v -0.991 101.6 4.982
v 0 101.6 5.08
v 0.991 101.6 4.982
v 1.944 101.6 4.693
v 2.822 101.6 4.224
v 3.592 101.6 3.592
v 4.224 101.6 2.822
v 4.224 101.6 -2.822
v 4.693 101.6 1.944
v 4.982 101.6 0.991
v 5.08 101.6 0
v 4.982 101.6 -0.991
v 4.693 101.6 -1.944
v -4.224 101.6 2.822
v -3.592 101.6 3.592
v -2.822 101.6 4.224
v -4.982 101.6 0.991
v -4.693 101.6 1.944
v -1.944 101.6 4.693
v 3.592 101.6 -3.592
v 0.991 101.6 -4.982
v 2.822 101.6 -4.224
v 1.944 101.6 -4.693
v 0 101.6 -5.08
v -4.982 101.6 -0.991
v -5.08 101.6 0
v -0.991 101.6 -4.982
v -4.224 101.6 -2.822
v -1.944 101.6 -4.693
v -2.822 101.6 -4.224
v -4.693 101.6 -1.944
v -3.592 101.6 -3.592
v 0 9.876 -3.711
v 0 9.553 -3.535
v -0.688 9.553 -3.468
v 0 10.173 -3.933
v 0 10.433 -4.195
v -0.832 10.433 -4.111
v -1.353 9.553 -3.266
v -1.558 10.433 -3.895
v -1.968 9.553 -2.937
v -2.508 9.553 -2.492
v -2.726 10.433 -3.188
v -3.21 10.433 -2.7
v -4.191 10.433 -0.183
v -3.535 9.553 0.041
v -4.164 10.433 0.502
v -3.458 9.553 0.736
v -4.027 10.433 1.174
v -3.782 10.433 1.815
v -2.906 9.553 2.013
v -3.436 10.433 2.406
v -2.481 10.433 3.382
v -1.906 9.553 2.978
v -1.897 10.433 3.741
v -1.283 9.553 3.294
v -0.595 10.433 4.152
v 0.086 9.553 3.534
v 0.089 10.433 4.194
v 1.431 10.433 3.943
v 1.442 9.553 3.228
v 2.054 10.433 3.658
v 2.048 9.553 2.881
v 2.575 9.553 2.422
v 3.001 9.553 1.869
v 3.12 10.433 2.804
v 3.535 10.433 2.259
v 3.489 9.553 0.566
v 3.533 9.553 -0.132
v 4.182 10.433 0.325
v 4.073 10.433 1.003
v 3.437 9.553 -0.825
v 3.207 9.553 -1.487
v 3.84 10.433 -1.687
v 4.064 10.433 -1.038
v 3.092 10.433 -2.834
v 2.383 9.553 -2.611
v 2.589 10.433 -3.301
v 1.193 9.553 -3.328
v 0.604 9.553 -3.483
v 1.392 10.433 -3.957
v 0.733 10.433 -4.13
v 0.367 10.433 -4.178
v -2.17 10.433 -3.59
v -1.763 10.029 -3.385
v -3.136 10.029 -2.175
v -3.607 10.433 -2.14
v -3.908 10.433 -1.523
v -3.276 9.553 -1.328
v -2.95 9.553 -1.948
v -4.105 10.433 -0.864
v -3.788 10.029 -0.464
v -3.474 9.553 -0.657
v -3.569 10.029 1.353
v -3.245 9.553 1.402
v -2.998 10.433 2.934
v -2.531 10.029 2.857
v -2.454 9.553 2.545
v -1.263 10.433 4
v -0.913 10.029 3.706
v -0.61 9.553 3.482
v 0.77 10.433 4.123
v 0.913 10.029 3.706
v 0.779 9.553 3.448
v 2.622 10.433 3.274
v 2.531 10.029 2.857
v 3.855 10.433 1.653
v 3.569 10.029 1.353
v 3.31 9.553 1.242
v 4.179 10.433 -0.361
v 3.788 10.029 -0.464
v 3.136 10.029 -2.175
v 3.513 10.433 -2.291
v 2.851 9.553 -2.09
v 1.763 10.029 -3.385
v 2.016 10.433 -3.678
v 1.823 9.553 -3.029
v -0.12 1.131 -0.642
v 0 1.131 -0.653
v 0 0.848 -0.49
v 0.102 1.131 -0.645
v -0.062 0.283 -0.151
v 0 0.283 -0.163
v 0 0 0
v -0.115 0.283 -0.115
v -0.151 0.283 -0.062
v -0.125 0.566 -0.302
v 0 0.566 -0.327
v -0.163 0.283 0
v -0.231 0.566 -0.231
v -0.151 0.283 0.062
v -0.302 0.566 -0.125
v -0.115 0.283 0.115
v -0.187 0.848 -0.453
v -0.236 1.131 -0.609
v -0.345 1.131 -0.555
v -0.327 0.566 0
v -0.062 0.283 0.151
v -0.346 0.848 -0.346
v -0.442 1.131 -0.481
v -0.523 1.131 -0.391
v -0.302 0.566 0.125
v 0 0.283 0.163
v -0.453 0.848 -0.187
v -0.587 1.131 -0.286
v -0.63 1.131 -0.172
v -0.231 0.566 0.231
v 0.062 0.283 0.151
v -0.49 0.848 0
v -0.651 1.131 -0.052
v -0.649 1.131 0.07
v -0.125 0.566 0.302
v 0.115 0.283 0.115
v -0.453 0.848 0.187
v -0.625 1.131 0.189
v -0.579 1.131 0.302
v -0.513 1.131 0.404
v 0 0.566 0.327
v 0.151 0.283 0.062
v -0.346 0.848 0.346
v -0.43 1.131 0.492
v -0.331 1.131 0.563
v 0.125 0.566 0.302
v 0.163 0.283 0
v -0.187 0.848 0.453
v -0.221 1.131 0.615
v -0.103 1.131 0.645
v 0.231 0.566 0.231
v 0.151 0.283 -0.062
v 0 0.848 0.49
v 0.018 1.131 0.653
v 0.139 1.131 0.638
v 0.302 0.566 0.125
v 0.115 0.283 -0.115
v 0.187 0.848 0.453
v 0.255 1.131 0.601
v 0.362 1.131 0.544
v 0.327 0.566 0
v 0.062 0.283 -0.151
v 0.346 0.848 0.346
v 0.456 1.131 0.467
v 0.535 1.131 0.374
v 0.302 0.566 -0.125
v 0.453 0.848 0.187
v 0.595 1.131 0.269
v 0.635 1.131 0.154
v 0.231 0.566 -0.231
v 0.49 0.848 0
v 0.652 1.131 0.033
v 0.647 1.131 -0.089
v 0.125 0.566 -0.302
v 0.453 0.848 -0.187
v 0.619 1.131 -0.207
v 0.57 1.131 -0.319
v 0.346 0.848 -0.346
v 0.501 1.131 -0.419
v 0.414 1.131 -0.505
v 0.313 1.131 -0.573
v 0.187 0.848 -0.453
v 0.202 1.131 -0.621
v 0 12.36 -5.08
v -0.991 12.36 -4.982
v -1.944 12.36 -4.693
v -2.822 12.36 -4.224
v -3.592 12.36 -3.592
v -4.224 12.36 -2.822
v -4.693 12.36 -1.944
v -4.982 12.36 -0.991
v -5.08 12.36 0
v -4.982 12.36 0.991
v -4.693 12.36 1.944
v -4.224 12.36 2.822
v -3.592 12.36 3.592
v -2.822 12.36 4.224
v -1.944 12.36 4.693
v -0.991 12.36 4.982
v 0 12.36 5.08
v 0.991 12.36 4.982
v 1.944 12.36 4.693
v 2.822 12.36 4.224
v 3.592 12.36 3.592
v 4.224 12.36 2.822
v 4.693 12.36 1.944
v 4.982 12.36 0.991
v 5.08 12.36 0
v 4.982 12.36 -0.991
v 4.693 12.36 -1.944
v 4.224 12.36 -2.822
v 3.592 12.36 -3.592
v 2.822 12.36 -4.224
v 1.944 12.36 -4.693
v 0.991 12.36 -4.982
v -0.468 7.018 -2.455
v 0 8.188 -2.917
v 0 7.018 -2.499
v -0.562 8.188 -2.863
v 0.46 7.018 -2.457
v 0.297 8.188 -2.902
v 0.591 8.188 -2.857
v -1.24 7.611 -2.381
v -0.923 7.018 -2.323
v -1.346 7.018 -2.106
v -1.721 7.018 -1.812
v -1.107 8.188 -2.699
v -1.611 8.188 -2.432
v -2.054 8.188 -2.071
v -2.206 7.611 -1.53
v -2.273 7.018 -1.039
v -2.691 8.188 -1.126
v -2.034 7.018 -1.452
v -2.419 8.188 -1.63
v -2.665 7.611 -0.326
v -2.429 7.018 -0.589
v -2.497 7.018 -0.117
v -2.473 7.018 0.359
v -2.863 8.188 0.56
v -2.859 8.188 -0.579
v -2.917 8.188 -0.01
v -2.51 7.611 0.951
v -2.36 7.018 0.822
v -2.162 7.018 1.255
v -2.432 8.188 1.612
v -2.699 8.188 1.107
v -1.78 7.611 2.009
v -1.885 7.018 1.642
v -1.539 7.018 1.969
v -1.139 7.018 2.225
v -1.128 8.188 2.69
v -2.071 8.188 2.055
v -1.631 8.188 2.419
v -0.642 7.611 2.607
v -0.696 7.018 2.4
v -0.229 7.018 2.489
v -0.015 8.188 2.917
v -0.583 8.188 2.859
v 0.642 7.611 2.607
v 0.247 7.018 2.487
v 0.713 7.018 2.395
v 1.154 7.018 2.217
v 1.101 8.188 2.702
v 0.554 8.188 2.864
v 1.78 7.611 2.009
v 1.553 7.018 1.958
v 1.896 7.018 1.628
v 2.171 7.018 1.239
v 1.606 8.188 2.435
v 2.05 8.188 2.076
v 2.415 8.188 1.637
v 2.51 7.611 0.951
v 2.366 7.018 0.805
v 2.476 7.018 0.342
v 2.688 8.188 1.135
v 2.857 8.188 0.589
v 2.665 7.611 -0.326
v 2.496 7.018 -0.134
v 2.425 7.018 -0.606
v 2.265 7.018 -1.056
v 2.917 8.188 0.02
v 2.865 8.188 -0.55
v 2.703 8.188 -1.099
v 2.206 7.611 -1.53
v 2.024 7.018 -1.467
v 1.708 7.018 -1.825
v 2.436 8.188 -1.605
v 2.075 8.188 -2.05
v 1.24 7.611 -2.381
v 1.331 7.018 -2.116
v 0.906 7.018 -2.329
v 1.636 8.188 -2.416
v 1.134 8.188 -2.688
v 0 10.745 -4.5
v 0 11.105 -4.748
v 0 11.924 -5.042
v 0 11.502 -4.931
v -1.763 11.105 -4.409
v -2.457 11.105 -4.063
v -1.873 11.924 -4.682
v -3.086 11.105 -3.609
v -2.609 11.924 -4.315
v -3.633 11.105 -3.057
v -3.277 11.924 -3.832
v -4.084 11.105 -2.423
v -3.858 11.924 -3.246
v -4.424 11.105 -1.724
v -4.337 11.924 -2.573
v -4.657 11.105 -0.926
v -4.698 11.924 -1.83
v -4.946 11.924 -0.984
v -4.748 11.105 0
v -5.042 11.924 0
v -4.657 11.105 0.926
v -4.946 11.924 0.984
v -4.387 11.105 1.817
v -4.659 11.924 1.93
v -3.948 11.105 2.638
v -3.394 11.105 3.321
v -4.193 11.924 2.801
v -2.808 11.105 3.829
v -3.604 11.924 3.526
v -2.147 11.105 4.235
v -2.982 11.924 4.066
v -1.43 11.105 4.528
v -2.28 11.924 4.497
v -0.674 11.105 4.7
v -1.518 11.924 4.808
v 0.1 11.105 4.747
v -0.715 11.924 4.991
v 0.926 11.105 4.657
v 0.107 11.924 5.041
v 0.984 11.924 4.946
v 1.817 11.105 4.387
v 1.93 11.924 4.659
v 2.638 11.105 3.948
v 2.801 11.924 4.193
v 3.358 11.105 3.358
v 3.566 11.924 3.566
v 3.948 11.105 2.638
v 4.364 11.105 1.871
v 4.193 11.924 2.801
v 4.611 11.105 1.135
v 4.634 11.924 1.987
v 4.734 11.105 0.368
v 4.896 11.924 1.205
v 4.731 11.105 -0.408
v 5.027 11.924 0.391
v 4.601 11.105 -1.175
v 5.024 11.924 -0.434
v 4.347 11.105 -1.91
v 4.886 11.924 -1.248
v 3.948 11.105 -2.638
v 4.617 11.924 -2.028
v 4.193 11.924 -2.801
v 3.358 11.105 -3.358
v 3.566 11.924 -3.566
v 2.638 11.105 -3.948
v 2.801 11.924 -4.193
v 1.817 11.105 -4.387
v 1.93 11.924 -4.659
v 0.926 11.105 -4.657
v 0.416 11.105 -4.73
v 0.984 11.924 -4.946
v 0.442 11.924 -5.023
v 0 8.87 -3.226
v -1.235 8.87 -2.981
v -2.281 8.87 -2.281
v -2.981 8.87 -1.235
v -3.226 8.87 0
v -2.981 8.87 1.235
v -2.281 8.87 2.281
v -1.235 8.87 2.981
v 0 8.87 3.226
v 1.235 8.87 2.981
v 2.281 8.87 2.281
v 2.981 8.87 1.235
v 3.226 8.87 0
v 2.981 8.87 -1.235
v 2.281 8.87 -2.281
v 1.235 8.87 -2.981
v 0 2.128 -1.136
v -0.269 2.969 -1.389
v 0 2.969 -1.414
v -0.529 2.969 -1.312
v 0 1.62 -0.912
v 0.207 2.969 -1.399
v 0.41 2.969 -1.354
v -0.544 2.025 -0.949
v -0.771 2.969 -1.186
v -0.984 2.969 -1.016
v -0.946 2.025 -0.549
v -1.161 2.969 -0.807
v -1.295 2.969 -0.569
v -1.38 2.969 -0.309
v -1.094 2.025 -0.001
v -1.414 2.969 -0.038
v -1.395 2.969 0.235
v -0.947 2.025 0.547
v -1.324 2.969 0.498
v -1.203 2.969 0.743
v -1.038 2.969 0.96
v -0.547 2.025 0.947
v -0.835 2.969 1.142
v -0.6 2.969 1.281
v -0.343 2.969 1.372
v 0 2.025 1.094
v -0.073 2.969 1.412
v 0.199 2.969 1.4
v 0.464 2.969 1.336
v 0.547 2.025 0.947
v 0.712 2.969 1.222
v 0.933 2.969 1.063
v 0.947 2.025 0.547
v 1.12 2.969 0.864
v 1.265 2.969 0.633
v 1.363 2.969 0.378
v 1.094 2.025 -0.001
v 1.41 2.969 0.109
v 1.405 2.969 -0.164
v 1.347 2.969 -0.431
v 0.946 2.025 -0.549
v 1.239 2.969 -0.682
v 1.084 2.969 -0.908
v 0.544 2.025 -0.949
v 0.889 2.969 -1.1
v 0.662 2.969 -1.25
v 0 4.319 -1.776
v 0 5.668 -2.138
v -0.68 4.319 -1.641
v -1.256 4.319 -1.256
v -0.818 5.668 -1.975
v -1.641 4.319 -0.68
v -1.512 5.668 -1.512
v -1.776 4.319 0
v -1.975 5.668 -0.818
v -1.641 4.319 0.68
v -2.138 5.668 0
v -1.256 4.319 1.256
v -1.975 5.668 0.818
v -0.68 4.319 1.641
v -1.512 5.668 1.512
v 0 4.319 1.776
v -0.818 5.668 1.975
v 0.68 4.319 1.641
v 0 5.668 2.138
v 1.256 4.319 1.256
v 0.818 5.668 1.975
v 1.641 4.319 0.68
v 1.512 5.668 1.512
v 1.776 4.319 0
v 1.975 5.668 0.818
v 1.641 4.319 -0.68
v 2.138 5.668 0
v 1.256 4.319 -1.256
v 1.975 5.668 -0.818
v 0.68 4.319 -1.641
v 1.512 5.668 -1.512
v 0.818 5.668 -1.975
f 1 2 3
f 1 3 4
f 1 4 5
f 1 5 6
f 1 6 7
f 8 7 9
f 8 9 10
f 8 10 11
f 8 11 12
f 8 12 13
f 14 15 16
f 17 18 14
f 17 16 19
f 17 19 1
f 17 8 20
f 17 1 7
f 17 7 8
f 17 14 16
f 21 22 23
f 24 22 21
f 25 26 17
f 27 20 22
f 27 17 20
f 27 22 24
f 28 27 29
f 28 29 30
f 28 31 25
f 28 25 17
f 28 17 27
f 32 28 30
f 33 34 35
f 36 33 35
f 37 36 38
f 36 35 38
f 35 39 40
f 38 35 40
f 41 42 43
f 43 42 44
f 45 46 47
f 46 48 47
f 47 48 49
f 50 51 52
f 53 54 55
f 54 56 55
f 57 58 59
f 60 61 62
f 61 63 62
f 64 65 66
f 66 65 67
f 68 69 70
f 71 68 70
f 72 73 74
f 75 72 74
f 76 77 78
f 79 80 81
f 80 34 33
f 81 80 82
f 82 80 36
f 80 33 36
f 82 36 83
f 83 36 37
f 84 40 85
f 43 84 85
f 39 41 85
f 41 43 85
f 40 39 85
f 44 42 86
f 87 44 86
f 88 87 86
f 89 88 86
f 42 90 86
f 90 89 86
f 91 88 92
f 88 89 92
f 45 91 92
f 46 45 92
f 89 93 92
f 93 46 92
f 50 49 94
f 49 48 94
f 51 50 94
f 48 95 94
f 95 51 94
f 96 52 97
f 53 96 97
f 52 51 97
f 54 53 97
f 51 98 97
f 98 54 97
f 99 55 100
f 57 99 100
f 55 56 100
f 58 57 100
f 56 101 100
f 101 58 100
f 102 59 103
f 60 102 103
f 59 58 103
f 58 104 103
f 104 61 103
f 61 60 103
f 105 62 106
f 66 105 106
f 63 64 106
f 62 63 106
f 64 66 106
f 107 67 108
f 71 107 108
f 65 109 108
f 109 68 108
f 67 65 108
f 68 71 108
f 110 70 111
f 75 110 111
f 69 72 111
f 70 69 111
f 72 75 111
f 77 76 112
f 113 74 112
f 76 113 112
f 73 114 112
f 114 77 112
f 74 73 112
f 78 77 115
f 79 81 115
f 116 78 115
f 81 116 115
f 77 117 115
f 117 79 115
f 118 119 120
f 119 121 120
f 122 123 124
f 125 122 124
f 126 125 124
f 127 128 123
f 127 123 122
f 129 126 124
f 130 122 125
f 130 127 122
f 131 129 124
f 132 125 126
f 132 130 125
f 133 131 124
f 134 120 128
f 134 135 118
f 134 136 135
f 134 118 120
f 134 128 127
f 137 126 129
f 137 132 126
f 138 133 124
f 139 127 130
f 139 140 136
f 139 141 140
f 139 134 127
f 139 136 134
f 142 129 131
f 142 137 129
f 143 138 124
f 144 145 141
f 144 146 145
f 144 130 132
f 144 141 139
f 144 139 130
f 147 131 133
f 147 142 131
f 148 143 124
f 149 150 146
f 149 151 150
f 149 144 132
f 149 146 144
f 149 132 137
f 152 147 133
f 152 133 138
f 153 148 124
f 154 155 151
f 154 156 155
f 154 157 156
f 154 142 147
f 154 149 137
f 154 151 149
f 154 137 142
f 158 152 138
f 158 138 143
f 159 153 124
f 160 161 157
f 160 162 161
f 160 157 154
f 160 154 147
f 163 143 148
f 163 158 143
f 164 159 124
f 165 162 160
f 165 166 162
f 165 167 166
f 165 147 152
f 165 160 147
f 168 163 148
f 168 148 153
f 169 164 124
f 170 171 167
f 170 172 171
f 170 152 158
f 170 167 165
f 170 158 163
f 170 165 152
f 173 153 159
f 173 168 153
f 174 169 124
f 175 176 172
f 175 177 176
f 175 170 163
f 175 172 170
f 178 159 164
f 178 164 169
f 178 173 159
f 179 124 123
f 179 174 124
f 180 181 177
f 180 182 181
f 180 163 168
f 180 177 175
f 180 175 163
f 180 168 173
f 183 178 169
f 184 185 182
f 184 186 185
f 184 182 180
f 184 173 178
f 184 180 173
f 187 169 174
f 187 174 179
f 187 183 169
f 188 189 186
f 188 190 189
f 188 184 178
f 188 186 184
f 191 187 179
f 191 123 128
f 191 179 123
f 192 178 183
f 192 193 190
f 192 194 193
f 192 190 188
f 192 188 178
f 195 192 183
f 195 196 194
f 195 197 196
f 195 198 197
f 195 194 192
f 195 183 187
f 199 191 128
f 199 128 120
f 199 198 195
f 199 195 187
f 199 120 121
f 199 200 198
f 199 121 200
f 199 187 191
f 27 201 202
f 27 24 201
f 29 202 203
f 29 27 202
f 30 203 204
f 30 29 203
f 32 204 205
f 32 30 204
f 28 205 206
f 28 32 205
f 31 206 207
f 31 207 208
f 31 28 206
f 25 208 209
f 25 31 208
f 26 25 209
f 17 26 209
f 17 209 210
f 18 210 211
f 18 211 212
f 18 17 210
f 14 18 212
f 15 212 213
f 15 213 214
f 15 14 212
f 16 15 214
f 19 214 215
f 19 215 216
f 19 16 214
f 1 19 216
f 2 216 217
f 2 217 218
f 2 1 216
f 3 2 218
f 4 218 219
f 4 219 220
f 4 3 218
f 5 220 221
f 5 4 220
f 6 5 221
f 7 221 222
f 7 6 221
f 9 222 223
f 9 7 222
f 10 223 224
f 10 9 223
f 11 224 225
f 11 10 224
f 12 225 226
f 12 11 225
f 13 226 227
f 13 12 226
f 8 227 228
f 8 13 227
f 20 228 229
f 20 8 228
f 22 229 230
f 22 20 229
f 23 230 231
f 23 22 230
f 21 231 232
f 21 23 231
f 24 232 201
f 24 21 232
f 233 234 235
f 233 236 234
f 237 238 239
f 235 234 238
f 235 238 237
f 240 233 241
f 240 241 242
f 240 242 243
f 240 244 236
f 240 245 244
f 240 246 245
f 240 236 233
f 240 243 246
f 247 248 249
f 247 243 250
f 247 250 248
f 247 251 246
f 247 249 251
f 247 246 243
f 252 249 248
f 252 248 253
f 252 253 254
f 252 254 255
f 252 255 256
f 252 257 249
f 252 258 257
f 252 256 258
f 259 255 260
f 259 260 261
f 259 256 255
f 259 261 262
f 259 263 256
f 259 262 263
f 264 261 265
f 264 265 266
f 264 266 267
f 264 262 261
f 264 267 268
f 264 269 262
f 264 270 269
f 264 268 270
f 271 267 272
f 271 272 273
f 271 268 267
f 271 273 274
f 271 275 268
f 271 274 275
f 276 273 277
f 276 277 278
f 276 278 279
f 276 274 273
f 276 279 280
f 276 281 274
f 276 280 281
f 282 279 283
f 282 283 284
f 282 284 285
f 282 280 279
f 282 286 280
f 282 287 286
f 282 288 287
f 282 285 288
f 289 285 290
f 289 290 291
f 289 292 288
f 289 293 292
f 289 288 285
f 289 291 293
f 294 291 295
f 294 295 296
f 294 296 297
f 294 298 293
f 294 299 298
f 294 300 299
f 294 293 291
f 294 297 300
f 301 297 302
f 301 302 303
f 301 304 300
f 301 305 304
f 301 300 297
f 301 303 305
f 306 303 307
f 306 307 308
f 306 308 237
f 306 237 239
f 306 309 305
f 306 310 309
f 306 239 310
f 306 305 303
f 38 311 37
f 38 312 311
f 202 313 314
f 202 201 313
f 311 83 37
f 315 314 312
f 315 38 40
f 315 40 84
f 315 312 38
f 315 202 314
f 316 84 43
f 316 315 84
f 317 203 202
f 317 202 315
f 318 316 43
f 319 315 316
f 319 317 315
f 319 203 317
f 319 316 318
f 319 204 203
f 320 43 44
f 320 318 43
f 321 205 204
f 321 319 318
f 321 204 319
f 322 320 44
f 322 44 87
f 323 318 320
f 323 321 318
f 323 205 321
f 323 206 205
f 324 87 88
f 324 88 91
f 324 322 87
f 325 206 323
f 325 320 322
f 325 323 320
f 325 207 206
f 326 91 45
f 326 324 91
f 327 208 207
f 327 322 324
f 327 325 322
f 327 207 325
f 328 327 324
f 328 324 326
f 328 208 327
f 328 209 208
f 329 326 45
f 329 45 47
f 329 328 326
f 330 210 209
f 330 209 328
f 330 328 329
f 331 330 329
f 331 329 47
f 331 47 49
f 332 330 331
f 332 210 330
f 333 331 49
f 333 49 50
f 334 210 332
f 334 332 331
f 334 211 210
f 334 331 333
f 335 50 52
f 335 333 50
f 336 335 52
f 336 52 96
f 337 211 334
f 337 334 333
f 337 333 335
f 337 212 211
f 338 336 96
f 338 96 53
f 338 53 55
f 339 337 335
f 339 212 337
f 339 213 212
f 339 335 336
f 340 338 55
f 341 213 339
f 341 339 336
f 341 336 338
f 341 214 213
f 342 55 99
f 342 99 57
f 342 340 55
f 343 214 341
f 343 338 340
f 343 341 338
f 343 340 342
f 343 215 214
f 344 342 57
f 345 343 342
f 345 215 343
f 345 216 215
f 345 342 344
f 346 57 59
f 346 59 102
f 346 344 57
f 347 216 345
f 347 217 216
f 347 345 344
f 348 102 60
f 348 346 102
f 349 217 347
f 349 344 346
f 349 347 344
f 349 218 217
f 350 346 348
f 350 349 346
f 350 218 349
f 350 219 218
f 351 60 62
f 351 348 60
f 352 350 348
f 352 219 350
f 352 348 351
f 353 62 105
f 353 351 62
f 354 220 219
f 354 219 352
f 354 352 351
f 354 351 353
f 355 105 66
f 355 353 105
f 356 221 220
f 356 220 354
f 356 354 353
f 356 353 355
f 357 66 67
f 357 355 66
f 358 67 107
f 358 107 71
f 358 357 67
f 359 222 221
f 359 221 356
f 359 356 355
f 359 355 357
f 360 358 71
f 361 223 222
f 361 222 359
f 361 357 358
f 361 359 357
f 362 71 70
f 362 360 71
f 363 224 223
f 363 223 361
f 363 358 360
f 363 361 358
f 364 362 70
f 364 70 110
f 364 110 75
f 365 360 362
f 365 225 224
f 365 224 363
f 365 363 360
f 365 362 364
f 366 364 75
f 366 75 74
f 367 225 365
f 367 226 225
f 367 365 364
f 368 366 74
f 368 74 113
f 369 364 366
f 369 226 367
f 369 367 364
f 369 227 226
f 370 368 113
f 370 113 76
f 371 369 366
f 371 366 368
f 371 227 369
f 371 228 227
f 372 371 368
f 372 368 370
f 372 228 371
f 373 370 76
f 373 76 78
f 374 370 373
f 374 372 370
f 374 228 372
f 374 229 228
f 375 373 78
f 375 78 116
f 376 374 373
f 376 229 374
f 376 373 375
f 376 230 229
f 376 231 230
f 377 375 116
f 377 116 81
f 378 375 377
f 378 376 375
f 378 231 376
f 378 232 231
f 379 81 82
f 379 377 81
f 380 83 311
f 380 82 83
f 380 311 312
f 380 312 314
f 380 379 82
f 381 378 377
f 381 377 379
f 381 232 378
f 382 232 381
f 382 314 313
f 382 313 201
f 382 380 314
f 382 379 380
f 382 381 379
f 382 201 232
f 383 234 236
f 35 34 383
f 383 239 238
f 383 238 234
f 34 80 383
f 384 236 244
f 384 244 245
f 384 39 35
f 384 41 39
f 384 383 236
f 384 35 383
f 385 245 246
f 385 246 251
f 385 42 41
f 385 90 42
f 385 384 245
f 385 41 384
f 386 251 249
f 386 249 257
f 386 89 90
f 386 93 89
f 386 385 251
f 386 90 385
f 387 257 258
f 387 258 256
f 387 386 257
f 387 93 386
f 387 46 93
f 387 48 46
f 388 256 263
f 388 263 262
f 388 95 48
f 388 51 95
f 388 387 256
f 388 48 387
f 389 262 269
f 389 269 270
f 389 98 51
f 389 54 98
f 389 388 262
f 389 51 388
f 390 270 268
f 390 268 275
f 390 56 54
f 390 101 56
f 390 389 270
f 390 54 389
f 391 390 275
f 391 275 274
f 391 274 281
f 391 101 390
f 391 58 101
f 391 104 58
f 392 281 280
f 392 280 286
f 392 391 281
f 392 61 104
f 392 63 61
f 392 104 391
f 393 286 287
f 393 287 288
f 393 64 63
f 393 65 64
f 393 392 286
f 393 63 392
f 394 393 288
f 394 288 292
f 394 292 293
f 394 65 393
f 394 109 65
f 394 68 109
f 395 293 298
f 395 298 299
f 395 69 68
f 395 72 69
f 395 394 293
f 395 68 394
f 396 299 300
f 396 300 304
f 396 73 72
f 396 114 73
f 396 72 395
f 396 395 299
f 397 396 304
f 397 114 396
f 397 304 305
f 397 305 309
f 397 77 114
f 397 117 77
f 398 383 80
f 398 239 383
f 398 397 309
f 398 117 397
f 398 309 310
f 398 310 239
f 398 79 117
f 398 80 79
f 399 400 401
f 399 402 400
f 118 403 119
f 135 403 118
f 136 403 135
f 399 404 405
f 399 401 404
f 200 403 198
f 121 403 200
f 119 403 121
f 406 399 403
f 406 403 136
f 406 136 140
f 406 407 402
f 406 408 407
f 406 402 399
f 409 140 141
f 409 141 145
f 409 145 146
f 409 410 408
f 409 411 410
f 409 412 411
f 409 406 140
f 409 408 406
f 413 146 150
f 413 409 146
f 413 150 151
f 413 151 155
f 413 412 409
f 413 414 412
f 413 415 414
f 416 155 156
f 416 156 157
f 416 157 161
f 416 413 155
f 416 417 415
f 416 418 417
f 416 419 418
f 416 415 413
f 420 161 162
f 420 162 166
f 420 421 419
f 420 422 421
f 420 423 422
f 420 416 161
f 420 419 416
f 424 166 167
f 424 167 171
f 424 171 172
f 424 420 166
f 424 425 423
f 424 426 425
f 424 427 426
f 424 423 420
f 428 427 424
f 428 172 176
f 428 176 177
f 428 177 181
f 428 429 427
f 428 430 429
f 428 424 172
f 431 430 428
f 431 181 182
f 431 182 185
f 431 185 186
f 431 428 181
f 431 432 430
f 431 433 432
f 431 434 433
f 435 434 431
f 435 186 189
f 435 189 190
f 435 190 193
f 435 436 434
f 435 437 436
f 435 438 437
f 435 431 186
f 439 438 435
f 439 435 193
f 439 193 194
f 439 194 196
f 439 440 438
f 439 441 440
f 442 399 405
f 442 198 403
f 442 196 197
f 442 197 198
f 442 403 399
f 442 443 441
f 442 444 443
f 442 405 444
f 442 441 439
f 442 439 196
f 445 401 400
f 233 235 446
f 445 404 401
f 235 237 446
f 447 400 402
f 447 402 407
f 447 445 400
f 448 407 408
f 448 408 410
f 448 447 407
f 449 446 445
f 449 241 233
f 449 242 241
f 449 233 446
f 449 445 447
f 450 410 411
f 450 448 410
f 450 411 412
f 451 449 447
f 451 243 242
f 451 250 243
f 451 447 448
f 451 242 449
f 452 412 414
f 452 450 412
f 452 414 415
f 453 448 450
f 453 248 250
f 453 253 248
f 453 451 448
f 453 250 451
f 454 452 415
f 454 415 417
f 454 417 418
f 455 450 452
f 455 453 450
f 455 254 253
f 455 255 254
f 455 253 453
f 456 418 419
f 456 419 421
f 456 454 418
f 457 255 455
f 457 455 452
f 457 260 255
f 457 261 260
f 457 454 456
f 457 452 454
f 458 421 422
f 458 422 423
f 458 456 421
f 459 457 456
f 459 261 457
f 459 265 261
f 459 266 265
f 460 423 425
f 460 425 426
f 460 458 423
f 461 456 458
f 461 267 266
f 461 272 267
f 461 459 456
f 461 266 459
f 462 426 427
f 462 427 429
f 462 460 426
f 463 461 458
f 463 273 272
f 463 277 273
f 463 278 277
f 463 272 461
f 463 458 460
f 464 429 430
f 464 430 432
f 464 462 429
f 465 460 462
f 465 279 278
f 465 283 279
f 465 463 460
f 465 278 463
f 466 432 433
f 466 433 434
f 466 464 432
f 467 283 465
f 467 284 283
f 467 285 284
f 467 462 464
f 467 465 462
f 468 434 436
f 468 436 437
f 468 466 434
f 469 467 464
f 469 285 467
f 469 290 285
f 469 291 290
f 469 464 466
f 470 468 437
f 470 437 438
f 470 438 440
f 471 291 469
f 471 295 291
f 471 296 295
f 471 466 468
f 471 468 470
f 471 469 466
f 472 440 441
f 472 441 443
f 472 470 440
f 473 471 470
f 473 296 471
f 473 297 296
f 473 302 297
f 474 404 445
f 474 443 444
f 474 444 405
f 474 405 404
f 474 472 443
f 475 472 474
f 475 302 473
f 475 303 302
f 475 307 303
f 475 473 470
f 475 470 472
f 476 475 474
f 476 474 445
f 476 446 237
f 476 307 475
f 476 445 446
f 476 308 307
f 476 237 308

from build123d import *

# Parameters (mm, degrees)
FILLET1_R = 2.54
FILLET2_R = 2.54
FILLET3_R = 7.62


with BuildPart() as part:
    # Sketch1 → Revolve1 (revolve)
    with BuildSketch(Plane.XY, mode=Mode.PRIVATE) as revolve1_sk:
        Polygon((0, 0), (1.154700538, 2), (2.660575, 7.62), (3.81, 10.16), (5.08, 10.16), (5.08, 101.6), (0, 101.6), align=None)
    revolve(revolve1_sk.sketch.rotate(Axis((0, 0, 0), (0, 1, 0)), 90), axis=Axis((0, 0, 0), (0, 1, 0)))

    # Fillet1
    # the kernel refuses this fillet: 2.54 mm, written as the material it takes off along each edge
    with BuildSketch(Plane(origin=(0, 10.16, 0), x_dir=(0, 0, -1), z_dir=(1, 0, 0))) as fillet1_piece_1:
        with BuildLine():
            CenterArc((2.54, 2.199704526), FILLET1_R, 300, 60)
            Line((5.08, 2.199704526), (5.1308, 2.199704526))
            Line((5.1308, 2.199704526), (5.1308, 0))
            Line((5.1308, 0), (5.08, -0.0508))
            ThreePointArc((5.08, -0.0508), (4.445, -0.0508), (3.8354, -0.043994091))
            Line((3.8354, -0.043994091), (3.81, 0))
        make_face()
    revolve(axis=Axis((0, 10.16, 0), (0, 1, 0)), mode=Mode.SUBTRACT)

    # Fillet2
    fillet2_edges = [part.edges().sort_by_distance(p)[0] for p in [
        (0, 10.16, 3.81),
    ]]
    fillet(fillet2_edges, radius=FILLET2_R)

    # Fillet3
    fillet3_edges = [part.edges().sort_by_distance(p)[0] for p in [
        (0, 7.62, 2.660575),
        (0, 2, 1.154700538),
    ]]
    fillet(fillet3_edges, radius=FILLET3_R)


solid = part.part
